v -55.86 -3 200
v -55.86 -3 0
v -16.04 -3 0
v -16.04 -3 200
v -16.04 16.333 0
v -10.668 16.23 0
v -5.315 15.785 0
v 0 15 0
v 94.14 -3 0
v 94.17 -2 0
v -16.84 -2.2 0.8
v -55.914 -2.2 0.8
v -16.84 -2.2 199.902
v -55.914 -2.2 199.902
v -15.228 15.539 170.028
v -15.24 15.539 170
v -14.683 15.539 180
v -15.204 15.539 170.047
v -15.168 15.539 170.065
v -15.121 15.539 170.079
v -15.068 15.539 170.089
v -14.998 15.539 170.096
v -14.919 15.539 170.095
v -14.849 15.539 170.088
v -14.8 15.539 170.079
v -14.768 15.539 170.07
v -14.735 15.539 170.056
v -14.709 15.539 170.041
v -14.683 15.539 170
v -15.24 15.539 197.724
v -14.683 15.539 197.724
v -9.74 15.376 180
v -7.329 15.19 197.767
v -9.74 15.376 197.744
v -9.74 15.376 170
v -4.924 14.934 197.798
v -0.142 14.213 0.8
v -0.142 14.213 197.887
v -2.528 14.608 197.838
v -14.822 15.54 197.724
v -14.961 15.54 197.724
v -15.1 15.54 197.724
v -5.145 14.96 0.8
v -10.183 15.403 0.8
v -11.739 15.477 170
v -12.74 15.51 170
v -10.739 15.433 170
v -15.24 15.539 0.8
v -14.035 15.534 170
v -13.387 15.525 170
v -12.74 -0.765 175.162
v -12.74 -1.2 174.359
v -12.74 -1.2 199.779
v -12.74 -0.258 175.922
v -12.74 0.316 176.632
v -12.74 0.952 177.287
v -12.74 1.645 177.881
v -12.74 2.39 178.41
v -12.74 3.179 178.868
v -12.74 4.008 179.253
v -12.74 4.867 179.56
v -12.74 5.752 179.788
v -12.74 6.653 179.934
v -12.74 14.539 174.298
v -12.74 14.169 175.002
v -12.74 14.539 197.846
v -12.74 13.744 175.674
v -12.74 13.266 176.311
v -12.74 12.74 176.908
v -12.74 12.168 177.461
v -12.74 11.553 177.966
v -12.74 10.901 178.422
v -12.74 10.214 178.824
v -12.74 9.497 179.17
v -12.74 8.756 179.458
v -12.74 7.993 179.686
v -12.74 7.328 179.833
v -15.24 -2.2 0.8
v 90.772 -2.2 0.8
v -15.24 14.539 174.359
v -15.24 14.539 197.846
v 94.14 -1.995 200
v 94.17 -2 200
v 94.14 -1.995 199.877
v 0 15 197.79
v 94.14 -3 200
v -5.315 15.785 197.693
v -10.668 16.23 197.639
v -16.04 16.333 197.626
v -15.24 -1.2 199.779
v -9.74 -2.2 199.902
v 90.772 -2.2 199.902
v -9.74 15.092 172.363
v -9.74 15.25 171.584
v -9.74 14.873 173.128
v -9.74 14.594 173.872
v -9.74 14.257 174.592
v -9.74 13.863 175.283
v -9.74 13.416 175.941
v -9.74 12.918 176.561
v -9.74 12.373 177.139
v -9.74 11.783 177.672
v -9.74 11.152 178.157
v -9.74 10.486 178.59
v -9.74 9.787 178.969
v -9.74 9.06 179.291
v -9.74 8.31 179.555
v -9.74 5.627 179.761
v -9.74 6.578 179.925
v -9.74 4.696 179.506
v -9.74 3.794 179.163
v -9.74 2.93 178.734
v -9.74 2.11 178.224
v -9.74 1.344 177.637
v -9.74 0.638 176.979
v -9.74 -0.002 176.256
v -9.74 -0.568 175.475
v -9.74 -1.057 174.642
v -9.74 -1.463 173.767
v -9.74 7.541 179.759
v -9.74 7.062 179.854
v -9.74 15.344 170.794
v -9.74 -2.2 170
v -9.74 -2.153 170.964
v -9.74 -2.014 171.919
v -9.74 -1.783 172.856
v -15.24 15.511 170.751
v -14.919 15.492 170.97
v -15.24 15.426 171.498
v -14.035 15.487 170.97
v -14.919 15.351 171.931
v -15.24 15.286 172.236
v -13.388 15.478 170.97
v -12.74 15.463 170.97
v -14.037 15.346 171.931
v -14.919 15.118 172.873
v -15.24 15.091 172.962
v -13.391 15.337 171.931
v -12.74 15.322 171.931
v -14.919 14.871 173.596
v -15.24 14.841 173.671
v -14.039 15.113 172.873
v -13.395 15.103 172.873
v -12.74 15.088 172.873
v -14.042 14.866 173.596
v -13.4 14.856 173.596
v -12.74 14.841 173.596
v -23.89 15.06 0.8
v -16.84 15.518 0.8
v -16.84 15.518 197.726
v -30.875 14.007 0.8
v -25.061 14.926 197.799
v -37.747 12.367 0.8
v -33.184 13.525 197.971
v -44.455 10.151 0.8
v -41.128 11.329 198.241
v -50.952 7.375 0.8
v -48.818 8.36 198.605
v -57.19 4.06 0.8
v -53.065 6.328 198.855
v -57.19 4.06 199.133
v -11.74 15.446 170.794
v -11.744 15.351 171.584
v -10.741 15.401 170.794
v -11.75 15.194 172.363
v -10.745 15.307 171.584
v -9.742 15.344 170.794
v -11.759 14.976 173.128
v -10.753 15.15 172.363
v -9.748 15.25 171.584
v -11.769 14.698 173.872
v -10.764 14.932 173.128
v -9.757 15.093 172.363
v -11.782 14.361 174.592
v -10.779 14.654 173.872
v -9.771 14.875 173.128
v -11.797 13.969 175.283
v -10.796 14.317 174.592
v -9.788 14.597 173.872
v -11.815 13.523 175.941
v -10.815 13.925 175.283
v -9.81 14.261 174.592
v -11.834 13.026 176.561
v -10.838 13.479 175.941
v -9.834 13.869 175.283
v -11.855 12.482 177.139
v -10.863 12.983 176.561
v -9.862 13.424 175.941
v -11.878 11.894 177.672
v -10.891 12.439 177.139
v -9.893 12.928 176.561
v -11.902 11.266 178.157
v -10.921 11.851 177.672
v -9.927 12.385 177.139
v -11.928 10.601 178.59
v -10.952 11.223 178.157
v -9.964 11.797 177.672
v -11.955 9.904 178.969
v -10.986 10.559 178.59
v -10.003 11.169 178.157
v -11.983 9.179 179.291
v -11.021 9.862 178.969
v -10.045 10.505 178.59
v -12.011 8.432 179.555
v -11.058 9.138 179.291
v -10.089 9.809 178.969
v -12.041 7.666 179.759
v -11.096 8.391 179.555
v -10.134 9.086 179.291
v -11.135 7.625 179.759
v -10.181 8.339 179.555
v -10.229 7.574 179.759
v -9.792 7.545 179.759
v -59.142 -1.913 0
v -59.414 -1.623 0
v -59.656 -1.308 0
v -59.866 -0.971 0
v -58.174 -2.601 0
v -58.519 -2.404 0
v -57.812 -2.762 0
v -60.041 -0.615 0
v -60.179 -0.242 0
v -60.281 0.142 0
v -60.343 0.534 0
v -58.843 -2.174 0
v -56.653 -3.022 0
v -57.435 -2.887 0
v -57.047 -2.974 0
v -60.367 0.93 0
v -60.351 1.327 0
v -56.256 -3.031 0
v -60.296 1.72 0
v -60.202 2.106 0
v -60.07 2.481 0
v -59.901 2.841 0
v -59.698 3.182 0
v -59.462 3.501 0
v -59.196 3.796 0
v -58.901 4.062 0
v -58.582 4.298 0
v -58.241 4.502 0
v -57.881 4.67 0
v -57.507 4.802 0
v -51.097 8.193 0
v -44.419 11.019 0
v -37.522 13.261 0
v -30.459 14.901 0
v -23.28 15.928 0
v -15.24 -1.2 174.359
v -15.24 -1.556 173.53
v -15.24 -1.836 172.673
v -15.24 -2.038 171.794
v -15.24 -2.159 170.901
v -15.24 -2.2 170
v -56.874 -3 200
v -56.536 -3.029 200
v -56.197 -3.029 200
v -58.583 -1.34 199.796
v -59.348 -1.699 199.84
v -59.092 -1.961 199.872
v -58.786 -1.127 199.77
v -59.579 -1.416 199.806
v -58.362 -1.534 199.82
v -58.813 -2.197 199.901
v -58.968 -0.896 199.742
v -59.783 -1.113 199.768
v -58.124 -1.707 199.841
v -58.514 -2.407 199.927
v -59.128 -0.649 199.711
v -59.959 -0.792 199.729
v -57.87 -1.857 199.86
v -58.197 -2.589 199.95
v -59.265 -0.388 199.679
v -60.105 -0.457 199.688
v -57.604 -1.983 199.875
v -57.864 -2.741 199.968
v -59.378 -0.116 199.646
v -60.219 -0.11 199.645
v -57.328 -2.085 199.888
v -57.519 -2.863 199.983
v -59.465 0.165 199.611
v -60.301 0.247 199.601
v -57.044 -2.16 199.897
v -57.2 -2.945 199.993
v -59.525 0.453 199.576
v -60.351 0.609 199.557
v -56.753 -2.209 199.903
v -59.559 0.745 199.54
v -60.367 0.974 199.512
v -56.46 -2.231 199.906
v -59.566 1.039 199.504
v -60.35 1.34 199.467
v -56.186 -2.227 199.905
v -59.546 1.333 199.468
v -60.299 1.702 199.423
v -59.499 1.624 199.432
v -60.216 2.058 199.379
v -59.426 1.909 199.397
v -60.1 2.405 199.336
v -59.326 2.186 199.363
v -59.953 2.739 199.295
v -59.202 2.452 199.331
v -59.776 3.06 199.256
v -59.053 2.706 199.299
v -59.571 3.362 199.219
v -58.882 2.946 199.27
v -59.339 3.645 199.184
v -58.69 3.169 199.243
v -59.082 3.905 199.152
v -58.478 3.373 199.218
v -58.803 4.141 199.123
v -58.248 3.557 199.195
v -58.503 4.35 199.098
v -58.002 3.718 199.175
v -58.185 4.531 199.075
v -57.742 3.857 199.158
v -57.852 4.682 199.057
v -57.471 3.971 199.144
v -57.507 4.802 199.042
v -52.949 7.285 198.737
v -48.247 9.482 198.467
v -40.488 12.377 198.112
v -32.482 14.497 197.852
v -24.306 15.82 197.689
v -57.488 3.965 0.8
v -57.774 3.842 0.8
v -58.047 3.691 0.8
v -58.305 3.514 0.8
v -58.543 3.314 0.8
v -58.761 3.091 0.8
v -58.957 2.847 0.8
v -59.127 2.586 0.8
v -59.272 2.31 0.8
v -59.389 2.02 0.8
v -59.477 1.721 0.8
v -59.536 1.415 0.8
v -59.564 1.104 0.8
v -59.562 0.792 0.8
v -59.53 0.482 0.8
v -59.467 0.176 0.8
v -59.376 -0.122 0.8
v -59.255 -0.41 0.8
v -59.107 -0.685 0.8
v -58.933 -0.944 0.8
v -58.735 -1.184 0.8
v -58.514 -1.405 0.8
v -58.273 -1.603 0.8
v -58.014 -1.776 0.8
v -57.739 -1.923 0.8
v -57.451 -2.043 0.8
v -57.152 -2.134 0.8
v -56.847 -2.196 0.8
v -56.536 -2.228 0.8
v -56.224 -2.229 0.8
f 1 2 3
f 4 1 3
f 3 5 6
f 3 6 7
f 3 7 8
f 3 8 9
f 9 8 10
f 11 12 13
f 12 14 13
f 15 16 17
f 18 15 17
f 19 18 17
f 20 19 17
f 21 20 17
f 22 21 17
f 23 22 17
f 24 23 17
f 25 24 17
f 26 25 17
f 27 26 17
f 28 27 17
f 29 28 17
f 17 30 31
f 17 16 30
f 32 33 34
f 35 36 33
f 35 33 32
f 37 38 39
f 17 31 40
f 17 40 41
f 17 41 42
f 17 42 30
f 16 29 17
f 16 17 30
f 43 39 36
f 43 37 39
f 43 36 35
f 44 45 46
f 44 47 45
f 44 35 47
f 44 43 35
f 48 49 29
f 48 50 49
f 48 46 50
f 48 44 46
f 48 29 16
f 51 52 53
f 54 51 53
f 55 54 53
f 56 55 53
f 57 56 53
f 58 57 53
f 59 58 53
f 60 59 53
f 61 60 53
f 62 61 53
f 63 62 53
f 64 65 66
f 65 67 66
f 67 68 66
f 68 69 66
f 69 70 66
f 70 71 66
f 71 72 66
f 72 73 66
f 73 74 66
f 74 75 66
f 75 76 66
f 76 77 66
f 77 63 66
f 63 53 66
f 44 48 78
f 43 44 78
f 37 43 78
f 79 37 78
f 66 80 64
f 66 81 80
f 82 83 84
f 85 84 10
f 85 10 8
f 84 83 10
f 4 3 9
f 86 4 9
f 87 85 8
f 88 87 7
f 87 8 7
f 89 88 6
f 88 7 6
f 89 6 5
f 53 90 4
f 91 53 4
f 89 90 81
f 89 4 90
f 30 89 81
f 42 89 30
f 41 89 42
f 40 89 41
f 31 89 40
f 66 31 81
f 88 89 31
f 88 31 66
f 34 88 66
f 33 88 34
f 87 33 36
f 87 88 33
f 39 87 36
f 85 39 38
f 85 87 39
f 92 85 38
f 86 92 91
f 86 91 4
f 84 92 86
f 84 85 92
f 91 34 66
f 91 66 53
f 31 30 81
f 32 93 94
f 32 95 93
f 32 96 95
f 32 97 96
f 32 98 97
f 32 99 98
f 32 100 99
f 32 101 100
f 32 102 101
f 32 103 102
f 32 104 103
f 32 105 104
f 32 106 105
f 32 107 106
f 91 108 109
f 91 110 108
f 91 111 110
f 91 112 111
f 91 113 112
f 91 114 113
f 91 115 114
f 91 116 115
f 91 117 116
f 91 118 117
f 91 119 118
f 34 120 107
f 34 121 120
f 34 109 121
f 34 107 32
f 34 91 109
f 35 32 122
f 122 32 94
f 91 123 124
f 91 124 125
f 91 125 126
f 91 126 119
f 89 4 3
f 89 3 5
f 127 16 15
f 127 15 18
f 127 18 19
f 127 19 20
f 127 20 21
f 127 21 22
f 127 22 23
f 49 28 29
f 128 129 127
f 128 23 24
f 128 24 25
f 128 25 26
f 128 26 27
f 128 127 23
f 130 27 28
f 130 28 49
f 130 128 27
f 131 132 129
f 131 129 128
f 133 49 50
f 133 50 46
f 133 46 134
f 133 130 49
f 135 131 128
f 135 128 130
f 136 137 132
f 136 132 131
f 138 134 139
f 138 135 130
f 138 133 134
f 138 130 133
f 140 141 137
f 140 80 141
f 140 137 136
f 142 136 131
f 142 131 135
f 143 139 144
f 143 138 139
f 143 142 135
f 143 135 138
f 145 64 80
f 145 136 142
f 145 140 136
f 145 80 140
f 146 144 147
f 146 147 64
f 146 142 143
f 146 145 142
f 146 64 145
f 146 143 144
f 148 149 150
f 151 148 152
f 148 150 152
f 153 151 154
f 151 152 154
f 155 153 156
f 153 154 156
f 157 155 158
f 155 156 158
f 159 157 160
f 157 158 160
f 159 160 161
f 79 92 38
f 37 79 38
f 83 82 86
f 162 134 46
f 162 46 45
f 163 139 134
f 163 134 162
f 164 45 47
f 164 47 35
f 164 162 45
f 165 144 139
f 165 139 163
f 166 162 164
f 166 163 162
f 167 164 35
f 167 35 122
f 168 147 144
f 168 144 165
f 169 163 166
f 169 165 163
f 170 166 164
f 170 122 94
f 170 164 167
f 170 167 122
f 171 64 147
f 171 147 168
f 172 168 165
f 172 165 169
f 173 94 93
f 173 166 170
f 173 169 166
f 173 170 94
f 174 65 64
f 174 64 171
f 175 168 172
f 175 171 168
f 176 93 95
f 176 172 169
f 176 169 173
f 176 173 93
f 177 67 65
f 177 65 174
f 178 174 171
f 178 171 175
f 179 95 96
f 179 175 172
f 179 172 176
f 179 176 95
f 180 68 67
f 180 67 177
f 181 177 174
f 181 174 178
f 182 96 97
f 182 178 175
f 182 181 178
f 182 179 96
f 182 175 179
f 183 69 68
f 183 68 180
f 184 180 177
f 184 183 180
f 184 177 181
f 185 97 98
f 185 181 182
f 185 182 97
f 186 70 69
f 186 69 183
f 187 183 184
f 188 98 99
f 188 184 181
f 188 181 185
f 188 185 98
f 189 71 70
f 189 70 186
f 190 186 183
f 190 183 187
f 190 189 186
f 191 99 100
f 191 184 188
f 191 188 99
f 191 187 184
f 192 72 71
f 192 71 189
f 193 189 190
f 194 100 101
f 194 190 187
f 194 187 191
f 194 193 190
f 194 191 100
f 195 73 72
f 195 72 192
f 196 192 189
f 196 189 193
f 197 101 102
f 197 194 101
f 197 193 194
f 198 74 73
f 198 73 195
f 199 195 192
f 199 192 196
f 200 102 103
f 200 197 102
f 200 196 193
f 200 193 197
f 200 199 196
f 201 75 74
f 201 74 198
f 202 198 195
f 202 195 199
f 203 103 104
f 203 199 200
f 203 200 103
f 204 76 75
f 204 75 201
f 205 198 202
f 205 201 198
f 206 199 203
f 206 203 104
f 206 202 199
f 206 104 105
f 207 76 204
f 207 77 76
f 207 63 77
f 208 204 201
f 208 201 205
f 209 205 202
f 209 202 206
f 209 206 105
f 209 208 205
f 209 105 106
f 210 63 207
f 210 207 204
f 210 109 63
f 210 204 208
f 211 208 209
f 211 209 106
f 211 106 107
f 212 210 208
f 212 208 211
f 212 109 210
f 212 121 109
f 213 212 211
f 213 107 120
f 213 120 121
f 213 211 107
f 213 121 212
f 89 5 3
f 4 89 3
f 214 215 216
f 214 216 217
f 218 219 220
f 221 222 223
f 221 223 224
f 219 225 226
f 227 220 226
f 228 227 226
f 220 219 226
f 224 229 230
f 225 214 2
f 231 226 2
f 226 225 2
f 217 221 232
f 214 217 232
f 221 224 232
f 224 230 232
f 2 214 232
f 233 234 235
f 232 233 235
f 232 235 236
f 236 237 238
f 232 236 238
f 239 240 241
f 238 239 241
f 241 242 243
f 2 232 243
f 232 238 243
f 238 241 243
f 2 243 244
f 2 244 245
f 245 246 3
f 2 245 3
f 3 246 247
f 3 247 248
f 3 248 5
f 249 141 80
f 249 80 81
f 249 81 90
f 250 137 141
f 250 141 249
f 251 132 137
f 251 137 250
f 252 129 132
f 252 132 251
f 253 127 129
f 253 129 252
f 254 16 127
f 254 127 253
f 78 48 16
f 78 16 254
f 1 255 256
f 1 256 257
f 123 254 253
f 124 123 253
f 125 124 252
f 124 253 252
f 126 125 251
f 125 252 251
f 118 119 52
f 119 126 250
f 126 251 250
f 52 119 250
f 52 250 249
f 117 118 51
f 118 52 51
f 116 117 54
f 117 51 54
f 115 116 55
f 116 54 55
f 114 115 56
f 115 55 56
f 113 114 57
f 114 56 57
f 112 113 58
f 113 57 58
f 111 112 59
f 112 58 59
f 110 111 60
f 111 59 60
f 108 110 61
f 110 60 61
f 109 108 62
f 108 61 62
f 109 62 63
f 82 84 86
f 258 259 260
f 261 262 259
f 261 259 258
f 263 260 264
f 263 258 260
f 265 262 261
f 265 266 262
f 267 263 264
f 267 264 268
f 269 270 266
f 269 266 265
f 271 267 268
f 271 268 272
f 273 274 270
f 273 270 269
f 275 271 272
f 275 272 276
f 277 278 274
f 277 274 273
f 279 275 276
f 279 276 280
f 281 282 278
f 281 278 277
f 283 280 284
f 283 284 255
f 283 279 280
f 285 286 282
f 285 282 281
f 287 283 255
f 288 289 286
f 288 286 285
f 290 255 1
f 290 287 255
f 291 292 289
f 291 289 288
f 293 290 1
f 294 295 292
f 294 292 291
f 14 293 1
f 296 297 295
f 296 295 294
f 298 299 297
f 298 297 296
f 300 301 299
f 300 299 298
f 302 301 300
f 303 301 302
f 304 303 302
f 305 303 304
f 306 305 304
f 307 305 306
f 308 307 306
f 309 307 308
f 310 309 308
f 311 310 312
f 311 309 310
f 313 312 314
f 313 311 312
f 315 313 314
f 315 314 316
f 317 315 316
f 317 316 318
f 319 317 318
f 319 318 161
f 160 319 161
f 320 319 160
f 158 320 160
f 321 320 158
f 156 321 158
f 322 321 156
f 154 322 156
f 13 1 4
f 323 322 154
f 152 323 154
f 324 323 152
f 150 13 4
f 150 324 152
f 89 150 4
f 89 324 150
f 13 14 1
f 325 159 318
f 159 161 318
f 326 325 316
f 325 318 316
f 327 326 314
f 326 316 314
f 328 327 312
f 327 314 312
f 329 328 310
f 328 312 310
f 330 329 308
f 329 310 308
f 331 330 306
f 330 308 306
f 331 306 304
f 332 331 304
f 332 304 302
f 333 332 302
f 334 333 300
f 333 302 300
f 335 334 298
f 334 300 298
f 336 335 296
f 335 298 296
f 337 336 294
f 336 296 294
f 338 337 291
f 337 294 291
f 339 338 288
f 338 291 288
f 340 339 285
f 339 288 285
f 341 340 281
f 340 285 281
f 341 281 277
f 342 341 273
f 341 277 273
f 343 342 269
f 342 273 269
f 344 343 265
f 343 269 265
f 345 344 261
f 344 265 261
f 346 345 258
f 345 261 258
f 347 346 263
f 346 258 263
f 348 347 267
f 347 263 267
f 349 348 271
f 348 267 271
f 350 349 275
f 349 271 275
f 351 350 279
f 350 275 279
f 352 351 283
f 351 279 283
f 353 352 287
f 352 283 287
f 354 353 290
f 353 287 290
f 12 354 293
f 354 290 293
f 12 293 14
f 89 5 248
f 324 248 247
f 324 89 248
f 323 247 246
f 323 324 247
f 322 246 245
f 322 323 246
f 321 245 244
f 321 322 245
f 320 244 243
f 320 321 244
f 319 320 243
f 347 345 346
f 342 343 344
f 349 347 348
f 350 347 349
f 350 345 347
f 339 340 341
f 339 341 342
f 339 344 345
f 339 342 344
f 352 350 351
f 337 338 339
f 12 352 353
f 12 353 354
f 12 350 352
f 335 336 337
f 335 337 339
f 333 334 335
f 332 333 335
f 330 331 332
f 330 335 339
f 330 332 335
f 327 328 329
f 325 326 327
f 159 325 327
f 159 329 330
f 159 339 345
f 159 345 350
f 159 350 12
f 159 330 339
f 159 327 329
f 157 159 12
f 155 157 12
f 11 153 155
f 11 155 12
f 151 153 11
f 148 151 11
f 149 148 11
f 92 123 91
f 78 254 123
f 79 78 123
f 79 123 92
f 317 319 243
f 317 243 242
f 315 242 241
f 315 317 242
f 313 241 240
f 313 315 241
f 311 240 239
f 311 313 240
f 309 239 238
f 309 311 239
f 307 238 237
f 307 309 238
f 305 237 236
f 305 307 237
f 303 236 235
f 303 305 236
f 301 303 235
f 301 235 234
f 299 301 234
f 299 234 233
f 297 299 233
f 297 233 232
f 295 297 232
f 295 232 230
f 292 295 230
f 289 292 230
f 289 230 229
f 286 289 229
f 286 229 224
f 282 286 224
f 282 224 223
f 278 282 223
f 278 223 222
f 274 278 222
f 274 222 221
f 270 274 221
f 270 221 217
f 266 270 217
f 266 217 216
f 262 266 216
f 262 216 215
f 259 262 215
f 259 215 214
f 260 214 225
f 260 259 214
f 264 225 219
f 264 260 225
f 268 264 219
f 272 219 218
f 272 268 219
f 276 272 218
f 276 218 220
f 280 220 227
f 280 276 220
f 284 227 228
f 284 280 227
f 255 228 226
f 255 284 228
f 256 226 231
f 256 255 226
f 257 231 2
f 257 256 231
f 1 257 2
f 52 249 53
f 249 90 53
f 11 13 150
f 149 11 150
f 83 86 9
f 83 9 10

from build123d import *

# Parameters (mm, degrees)
F1_DEPTH     = 200
F3_DEPTH     = 200
F4_T         = -0.8
F4_2_T       = -0.8
F5_W         = 2.5
F5_H         = 1
F6_DEPTH     = 20
F7_T4_DEPTH  = 5.5
F7_T9_DEPTH  = 30.5
F7_T14_ANGLE = 37.7423343373
F7_T20_ANGLE = 37.7423343373
F8_W         = 155.1876314091
F8_H         = 22.3366669118
F9_ANGLE     = 7


# Not quite as in the source:
# - a fillet or chamfer that OpenCascade refuses, or shapes differently, is made with other operations: its cross-section is extruded or revolved along the edge and cut away or added


with BuildPart() as f1:
    # F0 (on Top) → F1 (new body)
    with BuildSketch(Plane.XY):
        with BuildLine():
            Line((94.1401966023, -3), (94.1696608117, -2.0004341641))
            Line((94.1696608117, -2.0004341641), (0, 15))
            ThreePointArc((0, 15), (-7.9879059152, 16.0504323354), (-16.0396361483, 16.3327251865))
            Line((-16.0396361483, 16.3327251865), (-16.0396361483, -3))
            Line((-16.0396361483, -3), (94.1401966023, -3))
        make_face()
    extrude(amount=F1_DEPTH)

    # F4
    f4_openings = [f1.faces().sort_by_distance(p)[0] for p in [
        (22.614044, 3.891358, 200),
    ]]
    offset(amount=F4_T, openings=f4_openings)

    # F5 (on face) → F6 (join)
    with BuildSketch(Plane.XY.offset(200)):
        Polygon((-12.7396361483, -1.2), (-12.7396361483, -2.2), (-9.7396361483, -2.2), (-9.7396361483, 15.5391672506), (-12.7396361483, 15.5391672506), (-12.7396361483, 14.5391672506), align=None)
        with Locations((-13.9896361483, -1.7)):
            Rectangle(F5_W, F5_H)
        with Locations((-13.9896361483, 15.0391672506)):
            Rectangle(F5_W, F5_H)
    extrude(amount=-F6_DEPTH)

    # F7: fillet of radius 10 on 2 edges, made by hand


with BuildPart() as f3:
    # F2 (on face) → F3 (new body)
    with BuildSketch(Plane.XY.offset(200)):
        with BuildLine():
            Line((-16.0396361483, -3), (-16.0396361483, 16.3327251865))
            ThreePointArc((-16.0396361483, 16.3327251865), (-37.5222437907, 13.2612199418), (-57.5066562048, 4.8019152395))
            ThreePointArc((-57.5066562048, 4.8019152395), (-60.2806962129, 0.1415930949), (-55.8598033977, -3))
            Line((-55.8598033977, -3), (-16.0396361483, -3))
        make_face()
    extrude(amount=-F3_DEPTH)

    # F4#2
    f4_2_openings = [f3.faces().sort_by_distance(p)[0] for p in [
        (-34.83961, 5.023506, 200),
    ]]
    offset(amount=F4_2_T, openings=f4_2_openings, kind=Kind.INTERSECTION)


with BuildPart() as f7_tool2:
    # F7_s3 → F7_t4 (new body)
    with BuildSketch(Plane.YZ.offset(-15.2396361483)):
        with BuildLine():
            ThreePointArc((-2.2, 170), (0.7289321881, 177.0710678119), (7.8, 180))
            Line((7.8, 180), (-2.2, 180))
            Line((-2.2, 180), (-2.2, 170))
        make_face()
    extrude(amount=F7_T4_DEPTH)

    split(bisect_by=Plane.XZ.offset(1.2), keep=Keep.TOP)


with BuildPart() as f1_1:
    add(f1.part)

    # F7_t1: union F7_tool2
    add(f7_tool2.part)


with BuildPart() as f7_tool7:
    # F7_s8 → F7_t9 (new body)
    with BuildSketch(Plane.YZ.offset(-40.2396361483)):
        with BuildLine():
            ThreePointArc((-2.2, 170), (0.7289321881, 177.0710678119), (7.8, 180))
            Line((7.8, 180), (-2.2, 180))
            Line((-2.2, 180), (-2.2, 170))
        make_face()
    extrude(amount=F7_T9_DEPTH)

    split(bisect_by=Plane.YZ.offset(-12.7396361483), keep=Keep.TOP)


with BuildPart() as f1_2:
    add(f1_1.part)

    # F7_t6: union F7_tool7
    add(f7_tool7.part)


with BuildPart() as f7_tool12:
    # F7_s13 → F7_t14 (revolve)
    with BuildSketch(Plane(origin=(-32.6433997569, -9.9682739464, 0), x_dir=(0, 0, 1), z_dir=(-0.9564014883, -0.2920551201, 0))):
        with BuildLine():
            ThreePointArc((170, 22.8682565899), (177.0710678119, 19.9393244018), (180, 12.8682565899))
            Line((180, 12.8682565899), (180, 22.8682565899))
            Line((180, 22.8682565899), (170, 22.8682565899))
        make_face()
    revolve(axis=Axis((-14.9610707823, -67.8731164952, 180), (0, 0, -1)), revolution_arc=F7_T14_ANGLE)

    split(bisect_by=Plane.YZ.offset(-12.7396361483), keep=Keep.TOP)

    split(bisect_by=Plane.YZ.offset(-9.7396361483), keep=Keep.BOTTOM)


with BuildPart() as f1_3:
    add(f1_2.part)

    # F7_t11: union F7_tool12
    add(f7_tool12.part)


with BuildPart() as f7_tool18:
    # F7_s19 → F7_t20 (revolve)
    with BuildSketch(Plane(origin=(-32.6433997569, -9.9682739464, 0), x_dir=(0, 0, 1), z_dir=(-0.9564014883, -0.2920551201, 0))):
        with BuildLine():
            ThreePointArc((170, 22.8682565899), (177.0710678119, 19.9393244018), (180, 12.8682565899))
            Line((180, 12.8682565899), (180, 22.8682565899))
            Line((180, 22.8682565899), (170, 22.8682565899))
        make_face()
    revolve(axis=Axis((-14.9610707823, -67.8731164952, 180), (0, 0, -1)), revolution_arc=F7_T20_ANGLE)

    split(bisect_by=Plane.YZ.offset(-15.2396361483), keep=Keep.TOP)

    split(bisect_by=Plane.XZ.offset(-14.5391672506), keep=Keep.BOTTOM)

    split(bisect_by=Plane.XZ.offset(-15.5391672506), keep=Keep.TOP)

    split(bisect_by=Plane.YZ.offset(-9.7396361483), keep=Keep.BOTTOM)


with BuildPart() as f1_4:
    add(f1_3.part)

    # F7_t17: union F7_tool18
    add(f7_tool18.part)


with BuildPart() as f9_tool:
    # F8 (on face) → F9 (revolve)
    with BuildSketch(Plane.XY.offset(200)):
        with Locations((16.5463808977, 8.1683334559)):
            Rectangle(F8_W, F8_H)
    revolve(axis=Axis((16.5463808977, -3, 200), (-1, 0, 0)), revolution_arc=F9_ANGLE)


with BuildPart() as f1_5:
    add(f1_4.part)

    # F9: cut by f9_tool
    add(f9_tool.part, mode=Mode.SUBTRACT)


with BuildPart() as f3_1:
    add(f3.part)

    # F9: cut by f9_tool
    add(f9_tool.part, mode=Mode.SUBTRACT)


solid = Compound([f1_5.part, f3_1.part])
